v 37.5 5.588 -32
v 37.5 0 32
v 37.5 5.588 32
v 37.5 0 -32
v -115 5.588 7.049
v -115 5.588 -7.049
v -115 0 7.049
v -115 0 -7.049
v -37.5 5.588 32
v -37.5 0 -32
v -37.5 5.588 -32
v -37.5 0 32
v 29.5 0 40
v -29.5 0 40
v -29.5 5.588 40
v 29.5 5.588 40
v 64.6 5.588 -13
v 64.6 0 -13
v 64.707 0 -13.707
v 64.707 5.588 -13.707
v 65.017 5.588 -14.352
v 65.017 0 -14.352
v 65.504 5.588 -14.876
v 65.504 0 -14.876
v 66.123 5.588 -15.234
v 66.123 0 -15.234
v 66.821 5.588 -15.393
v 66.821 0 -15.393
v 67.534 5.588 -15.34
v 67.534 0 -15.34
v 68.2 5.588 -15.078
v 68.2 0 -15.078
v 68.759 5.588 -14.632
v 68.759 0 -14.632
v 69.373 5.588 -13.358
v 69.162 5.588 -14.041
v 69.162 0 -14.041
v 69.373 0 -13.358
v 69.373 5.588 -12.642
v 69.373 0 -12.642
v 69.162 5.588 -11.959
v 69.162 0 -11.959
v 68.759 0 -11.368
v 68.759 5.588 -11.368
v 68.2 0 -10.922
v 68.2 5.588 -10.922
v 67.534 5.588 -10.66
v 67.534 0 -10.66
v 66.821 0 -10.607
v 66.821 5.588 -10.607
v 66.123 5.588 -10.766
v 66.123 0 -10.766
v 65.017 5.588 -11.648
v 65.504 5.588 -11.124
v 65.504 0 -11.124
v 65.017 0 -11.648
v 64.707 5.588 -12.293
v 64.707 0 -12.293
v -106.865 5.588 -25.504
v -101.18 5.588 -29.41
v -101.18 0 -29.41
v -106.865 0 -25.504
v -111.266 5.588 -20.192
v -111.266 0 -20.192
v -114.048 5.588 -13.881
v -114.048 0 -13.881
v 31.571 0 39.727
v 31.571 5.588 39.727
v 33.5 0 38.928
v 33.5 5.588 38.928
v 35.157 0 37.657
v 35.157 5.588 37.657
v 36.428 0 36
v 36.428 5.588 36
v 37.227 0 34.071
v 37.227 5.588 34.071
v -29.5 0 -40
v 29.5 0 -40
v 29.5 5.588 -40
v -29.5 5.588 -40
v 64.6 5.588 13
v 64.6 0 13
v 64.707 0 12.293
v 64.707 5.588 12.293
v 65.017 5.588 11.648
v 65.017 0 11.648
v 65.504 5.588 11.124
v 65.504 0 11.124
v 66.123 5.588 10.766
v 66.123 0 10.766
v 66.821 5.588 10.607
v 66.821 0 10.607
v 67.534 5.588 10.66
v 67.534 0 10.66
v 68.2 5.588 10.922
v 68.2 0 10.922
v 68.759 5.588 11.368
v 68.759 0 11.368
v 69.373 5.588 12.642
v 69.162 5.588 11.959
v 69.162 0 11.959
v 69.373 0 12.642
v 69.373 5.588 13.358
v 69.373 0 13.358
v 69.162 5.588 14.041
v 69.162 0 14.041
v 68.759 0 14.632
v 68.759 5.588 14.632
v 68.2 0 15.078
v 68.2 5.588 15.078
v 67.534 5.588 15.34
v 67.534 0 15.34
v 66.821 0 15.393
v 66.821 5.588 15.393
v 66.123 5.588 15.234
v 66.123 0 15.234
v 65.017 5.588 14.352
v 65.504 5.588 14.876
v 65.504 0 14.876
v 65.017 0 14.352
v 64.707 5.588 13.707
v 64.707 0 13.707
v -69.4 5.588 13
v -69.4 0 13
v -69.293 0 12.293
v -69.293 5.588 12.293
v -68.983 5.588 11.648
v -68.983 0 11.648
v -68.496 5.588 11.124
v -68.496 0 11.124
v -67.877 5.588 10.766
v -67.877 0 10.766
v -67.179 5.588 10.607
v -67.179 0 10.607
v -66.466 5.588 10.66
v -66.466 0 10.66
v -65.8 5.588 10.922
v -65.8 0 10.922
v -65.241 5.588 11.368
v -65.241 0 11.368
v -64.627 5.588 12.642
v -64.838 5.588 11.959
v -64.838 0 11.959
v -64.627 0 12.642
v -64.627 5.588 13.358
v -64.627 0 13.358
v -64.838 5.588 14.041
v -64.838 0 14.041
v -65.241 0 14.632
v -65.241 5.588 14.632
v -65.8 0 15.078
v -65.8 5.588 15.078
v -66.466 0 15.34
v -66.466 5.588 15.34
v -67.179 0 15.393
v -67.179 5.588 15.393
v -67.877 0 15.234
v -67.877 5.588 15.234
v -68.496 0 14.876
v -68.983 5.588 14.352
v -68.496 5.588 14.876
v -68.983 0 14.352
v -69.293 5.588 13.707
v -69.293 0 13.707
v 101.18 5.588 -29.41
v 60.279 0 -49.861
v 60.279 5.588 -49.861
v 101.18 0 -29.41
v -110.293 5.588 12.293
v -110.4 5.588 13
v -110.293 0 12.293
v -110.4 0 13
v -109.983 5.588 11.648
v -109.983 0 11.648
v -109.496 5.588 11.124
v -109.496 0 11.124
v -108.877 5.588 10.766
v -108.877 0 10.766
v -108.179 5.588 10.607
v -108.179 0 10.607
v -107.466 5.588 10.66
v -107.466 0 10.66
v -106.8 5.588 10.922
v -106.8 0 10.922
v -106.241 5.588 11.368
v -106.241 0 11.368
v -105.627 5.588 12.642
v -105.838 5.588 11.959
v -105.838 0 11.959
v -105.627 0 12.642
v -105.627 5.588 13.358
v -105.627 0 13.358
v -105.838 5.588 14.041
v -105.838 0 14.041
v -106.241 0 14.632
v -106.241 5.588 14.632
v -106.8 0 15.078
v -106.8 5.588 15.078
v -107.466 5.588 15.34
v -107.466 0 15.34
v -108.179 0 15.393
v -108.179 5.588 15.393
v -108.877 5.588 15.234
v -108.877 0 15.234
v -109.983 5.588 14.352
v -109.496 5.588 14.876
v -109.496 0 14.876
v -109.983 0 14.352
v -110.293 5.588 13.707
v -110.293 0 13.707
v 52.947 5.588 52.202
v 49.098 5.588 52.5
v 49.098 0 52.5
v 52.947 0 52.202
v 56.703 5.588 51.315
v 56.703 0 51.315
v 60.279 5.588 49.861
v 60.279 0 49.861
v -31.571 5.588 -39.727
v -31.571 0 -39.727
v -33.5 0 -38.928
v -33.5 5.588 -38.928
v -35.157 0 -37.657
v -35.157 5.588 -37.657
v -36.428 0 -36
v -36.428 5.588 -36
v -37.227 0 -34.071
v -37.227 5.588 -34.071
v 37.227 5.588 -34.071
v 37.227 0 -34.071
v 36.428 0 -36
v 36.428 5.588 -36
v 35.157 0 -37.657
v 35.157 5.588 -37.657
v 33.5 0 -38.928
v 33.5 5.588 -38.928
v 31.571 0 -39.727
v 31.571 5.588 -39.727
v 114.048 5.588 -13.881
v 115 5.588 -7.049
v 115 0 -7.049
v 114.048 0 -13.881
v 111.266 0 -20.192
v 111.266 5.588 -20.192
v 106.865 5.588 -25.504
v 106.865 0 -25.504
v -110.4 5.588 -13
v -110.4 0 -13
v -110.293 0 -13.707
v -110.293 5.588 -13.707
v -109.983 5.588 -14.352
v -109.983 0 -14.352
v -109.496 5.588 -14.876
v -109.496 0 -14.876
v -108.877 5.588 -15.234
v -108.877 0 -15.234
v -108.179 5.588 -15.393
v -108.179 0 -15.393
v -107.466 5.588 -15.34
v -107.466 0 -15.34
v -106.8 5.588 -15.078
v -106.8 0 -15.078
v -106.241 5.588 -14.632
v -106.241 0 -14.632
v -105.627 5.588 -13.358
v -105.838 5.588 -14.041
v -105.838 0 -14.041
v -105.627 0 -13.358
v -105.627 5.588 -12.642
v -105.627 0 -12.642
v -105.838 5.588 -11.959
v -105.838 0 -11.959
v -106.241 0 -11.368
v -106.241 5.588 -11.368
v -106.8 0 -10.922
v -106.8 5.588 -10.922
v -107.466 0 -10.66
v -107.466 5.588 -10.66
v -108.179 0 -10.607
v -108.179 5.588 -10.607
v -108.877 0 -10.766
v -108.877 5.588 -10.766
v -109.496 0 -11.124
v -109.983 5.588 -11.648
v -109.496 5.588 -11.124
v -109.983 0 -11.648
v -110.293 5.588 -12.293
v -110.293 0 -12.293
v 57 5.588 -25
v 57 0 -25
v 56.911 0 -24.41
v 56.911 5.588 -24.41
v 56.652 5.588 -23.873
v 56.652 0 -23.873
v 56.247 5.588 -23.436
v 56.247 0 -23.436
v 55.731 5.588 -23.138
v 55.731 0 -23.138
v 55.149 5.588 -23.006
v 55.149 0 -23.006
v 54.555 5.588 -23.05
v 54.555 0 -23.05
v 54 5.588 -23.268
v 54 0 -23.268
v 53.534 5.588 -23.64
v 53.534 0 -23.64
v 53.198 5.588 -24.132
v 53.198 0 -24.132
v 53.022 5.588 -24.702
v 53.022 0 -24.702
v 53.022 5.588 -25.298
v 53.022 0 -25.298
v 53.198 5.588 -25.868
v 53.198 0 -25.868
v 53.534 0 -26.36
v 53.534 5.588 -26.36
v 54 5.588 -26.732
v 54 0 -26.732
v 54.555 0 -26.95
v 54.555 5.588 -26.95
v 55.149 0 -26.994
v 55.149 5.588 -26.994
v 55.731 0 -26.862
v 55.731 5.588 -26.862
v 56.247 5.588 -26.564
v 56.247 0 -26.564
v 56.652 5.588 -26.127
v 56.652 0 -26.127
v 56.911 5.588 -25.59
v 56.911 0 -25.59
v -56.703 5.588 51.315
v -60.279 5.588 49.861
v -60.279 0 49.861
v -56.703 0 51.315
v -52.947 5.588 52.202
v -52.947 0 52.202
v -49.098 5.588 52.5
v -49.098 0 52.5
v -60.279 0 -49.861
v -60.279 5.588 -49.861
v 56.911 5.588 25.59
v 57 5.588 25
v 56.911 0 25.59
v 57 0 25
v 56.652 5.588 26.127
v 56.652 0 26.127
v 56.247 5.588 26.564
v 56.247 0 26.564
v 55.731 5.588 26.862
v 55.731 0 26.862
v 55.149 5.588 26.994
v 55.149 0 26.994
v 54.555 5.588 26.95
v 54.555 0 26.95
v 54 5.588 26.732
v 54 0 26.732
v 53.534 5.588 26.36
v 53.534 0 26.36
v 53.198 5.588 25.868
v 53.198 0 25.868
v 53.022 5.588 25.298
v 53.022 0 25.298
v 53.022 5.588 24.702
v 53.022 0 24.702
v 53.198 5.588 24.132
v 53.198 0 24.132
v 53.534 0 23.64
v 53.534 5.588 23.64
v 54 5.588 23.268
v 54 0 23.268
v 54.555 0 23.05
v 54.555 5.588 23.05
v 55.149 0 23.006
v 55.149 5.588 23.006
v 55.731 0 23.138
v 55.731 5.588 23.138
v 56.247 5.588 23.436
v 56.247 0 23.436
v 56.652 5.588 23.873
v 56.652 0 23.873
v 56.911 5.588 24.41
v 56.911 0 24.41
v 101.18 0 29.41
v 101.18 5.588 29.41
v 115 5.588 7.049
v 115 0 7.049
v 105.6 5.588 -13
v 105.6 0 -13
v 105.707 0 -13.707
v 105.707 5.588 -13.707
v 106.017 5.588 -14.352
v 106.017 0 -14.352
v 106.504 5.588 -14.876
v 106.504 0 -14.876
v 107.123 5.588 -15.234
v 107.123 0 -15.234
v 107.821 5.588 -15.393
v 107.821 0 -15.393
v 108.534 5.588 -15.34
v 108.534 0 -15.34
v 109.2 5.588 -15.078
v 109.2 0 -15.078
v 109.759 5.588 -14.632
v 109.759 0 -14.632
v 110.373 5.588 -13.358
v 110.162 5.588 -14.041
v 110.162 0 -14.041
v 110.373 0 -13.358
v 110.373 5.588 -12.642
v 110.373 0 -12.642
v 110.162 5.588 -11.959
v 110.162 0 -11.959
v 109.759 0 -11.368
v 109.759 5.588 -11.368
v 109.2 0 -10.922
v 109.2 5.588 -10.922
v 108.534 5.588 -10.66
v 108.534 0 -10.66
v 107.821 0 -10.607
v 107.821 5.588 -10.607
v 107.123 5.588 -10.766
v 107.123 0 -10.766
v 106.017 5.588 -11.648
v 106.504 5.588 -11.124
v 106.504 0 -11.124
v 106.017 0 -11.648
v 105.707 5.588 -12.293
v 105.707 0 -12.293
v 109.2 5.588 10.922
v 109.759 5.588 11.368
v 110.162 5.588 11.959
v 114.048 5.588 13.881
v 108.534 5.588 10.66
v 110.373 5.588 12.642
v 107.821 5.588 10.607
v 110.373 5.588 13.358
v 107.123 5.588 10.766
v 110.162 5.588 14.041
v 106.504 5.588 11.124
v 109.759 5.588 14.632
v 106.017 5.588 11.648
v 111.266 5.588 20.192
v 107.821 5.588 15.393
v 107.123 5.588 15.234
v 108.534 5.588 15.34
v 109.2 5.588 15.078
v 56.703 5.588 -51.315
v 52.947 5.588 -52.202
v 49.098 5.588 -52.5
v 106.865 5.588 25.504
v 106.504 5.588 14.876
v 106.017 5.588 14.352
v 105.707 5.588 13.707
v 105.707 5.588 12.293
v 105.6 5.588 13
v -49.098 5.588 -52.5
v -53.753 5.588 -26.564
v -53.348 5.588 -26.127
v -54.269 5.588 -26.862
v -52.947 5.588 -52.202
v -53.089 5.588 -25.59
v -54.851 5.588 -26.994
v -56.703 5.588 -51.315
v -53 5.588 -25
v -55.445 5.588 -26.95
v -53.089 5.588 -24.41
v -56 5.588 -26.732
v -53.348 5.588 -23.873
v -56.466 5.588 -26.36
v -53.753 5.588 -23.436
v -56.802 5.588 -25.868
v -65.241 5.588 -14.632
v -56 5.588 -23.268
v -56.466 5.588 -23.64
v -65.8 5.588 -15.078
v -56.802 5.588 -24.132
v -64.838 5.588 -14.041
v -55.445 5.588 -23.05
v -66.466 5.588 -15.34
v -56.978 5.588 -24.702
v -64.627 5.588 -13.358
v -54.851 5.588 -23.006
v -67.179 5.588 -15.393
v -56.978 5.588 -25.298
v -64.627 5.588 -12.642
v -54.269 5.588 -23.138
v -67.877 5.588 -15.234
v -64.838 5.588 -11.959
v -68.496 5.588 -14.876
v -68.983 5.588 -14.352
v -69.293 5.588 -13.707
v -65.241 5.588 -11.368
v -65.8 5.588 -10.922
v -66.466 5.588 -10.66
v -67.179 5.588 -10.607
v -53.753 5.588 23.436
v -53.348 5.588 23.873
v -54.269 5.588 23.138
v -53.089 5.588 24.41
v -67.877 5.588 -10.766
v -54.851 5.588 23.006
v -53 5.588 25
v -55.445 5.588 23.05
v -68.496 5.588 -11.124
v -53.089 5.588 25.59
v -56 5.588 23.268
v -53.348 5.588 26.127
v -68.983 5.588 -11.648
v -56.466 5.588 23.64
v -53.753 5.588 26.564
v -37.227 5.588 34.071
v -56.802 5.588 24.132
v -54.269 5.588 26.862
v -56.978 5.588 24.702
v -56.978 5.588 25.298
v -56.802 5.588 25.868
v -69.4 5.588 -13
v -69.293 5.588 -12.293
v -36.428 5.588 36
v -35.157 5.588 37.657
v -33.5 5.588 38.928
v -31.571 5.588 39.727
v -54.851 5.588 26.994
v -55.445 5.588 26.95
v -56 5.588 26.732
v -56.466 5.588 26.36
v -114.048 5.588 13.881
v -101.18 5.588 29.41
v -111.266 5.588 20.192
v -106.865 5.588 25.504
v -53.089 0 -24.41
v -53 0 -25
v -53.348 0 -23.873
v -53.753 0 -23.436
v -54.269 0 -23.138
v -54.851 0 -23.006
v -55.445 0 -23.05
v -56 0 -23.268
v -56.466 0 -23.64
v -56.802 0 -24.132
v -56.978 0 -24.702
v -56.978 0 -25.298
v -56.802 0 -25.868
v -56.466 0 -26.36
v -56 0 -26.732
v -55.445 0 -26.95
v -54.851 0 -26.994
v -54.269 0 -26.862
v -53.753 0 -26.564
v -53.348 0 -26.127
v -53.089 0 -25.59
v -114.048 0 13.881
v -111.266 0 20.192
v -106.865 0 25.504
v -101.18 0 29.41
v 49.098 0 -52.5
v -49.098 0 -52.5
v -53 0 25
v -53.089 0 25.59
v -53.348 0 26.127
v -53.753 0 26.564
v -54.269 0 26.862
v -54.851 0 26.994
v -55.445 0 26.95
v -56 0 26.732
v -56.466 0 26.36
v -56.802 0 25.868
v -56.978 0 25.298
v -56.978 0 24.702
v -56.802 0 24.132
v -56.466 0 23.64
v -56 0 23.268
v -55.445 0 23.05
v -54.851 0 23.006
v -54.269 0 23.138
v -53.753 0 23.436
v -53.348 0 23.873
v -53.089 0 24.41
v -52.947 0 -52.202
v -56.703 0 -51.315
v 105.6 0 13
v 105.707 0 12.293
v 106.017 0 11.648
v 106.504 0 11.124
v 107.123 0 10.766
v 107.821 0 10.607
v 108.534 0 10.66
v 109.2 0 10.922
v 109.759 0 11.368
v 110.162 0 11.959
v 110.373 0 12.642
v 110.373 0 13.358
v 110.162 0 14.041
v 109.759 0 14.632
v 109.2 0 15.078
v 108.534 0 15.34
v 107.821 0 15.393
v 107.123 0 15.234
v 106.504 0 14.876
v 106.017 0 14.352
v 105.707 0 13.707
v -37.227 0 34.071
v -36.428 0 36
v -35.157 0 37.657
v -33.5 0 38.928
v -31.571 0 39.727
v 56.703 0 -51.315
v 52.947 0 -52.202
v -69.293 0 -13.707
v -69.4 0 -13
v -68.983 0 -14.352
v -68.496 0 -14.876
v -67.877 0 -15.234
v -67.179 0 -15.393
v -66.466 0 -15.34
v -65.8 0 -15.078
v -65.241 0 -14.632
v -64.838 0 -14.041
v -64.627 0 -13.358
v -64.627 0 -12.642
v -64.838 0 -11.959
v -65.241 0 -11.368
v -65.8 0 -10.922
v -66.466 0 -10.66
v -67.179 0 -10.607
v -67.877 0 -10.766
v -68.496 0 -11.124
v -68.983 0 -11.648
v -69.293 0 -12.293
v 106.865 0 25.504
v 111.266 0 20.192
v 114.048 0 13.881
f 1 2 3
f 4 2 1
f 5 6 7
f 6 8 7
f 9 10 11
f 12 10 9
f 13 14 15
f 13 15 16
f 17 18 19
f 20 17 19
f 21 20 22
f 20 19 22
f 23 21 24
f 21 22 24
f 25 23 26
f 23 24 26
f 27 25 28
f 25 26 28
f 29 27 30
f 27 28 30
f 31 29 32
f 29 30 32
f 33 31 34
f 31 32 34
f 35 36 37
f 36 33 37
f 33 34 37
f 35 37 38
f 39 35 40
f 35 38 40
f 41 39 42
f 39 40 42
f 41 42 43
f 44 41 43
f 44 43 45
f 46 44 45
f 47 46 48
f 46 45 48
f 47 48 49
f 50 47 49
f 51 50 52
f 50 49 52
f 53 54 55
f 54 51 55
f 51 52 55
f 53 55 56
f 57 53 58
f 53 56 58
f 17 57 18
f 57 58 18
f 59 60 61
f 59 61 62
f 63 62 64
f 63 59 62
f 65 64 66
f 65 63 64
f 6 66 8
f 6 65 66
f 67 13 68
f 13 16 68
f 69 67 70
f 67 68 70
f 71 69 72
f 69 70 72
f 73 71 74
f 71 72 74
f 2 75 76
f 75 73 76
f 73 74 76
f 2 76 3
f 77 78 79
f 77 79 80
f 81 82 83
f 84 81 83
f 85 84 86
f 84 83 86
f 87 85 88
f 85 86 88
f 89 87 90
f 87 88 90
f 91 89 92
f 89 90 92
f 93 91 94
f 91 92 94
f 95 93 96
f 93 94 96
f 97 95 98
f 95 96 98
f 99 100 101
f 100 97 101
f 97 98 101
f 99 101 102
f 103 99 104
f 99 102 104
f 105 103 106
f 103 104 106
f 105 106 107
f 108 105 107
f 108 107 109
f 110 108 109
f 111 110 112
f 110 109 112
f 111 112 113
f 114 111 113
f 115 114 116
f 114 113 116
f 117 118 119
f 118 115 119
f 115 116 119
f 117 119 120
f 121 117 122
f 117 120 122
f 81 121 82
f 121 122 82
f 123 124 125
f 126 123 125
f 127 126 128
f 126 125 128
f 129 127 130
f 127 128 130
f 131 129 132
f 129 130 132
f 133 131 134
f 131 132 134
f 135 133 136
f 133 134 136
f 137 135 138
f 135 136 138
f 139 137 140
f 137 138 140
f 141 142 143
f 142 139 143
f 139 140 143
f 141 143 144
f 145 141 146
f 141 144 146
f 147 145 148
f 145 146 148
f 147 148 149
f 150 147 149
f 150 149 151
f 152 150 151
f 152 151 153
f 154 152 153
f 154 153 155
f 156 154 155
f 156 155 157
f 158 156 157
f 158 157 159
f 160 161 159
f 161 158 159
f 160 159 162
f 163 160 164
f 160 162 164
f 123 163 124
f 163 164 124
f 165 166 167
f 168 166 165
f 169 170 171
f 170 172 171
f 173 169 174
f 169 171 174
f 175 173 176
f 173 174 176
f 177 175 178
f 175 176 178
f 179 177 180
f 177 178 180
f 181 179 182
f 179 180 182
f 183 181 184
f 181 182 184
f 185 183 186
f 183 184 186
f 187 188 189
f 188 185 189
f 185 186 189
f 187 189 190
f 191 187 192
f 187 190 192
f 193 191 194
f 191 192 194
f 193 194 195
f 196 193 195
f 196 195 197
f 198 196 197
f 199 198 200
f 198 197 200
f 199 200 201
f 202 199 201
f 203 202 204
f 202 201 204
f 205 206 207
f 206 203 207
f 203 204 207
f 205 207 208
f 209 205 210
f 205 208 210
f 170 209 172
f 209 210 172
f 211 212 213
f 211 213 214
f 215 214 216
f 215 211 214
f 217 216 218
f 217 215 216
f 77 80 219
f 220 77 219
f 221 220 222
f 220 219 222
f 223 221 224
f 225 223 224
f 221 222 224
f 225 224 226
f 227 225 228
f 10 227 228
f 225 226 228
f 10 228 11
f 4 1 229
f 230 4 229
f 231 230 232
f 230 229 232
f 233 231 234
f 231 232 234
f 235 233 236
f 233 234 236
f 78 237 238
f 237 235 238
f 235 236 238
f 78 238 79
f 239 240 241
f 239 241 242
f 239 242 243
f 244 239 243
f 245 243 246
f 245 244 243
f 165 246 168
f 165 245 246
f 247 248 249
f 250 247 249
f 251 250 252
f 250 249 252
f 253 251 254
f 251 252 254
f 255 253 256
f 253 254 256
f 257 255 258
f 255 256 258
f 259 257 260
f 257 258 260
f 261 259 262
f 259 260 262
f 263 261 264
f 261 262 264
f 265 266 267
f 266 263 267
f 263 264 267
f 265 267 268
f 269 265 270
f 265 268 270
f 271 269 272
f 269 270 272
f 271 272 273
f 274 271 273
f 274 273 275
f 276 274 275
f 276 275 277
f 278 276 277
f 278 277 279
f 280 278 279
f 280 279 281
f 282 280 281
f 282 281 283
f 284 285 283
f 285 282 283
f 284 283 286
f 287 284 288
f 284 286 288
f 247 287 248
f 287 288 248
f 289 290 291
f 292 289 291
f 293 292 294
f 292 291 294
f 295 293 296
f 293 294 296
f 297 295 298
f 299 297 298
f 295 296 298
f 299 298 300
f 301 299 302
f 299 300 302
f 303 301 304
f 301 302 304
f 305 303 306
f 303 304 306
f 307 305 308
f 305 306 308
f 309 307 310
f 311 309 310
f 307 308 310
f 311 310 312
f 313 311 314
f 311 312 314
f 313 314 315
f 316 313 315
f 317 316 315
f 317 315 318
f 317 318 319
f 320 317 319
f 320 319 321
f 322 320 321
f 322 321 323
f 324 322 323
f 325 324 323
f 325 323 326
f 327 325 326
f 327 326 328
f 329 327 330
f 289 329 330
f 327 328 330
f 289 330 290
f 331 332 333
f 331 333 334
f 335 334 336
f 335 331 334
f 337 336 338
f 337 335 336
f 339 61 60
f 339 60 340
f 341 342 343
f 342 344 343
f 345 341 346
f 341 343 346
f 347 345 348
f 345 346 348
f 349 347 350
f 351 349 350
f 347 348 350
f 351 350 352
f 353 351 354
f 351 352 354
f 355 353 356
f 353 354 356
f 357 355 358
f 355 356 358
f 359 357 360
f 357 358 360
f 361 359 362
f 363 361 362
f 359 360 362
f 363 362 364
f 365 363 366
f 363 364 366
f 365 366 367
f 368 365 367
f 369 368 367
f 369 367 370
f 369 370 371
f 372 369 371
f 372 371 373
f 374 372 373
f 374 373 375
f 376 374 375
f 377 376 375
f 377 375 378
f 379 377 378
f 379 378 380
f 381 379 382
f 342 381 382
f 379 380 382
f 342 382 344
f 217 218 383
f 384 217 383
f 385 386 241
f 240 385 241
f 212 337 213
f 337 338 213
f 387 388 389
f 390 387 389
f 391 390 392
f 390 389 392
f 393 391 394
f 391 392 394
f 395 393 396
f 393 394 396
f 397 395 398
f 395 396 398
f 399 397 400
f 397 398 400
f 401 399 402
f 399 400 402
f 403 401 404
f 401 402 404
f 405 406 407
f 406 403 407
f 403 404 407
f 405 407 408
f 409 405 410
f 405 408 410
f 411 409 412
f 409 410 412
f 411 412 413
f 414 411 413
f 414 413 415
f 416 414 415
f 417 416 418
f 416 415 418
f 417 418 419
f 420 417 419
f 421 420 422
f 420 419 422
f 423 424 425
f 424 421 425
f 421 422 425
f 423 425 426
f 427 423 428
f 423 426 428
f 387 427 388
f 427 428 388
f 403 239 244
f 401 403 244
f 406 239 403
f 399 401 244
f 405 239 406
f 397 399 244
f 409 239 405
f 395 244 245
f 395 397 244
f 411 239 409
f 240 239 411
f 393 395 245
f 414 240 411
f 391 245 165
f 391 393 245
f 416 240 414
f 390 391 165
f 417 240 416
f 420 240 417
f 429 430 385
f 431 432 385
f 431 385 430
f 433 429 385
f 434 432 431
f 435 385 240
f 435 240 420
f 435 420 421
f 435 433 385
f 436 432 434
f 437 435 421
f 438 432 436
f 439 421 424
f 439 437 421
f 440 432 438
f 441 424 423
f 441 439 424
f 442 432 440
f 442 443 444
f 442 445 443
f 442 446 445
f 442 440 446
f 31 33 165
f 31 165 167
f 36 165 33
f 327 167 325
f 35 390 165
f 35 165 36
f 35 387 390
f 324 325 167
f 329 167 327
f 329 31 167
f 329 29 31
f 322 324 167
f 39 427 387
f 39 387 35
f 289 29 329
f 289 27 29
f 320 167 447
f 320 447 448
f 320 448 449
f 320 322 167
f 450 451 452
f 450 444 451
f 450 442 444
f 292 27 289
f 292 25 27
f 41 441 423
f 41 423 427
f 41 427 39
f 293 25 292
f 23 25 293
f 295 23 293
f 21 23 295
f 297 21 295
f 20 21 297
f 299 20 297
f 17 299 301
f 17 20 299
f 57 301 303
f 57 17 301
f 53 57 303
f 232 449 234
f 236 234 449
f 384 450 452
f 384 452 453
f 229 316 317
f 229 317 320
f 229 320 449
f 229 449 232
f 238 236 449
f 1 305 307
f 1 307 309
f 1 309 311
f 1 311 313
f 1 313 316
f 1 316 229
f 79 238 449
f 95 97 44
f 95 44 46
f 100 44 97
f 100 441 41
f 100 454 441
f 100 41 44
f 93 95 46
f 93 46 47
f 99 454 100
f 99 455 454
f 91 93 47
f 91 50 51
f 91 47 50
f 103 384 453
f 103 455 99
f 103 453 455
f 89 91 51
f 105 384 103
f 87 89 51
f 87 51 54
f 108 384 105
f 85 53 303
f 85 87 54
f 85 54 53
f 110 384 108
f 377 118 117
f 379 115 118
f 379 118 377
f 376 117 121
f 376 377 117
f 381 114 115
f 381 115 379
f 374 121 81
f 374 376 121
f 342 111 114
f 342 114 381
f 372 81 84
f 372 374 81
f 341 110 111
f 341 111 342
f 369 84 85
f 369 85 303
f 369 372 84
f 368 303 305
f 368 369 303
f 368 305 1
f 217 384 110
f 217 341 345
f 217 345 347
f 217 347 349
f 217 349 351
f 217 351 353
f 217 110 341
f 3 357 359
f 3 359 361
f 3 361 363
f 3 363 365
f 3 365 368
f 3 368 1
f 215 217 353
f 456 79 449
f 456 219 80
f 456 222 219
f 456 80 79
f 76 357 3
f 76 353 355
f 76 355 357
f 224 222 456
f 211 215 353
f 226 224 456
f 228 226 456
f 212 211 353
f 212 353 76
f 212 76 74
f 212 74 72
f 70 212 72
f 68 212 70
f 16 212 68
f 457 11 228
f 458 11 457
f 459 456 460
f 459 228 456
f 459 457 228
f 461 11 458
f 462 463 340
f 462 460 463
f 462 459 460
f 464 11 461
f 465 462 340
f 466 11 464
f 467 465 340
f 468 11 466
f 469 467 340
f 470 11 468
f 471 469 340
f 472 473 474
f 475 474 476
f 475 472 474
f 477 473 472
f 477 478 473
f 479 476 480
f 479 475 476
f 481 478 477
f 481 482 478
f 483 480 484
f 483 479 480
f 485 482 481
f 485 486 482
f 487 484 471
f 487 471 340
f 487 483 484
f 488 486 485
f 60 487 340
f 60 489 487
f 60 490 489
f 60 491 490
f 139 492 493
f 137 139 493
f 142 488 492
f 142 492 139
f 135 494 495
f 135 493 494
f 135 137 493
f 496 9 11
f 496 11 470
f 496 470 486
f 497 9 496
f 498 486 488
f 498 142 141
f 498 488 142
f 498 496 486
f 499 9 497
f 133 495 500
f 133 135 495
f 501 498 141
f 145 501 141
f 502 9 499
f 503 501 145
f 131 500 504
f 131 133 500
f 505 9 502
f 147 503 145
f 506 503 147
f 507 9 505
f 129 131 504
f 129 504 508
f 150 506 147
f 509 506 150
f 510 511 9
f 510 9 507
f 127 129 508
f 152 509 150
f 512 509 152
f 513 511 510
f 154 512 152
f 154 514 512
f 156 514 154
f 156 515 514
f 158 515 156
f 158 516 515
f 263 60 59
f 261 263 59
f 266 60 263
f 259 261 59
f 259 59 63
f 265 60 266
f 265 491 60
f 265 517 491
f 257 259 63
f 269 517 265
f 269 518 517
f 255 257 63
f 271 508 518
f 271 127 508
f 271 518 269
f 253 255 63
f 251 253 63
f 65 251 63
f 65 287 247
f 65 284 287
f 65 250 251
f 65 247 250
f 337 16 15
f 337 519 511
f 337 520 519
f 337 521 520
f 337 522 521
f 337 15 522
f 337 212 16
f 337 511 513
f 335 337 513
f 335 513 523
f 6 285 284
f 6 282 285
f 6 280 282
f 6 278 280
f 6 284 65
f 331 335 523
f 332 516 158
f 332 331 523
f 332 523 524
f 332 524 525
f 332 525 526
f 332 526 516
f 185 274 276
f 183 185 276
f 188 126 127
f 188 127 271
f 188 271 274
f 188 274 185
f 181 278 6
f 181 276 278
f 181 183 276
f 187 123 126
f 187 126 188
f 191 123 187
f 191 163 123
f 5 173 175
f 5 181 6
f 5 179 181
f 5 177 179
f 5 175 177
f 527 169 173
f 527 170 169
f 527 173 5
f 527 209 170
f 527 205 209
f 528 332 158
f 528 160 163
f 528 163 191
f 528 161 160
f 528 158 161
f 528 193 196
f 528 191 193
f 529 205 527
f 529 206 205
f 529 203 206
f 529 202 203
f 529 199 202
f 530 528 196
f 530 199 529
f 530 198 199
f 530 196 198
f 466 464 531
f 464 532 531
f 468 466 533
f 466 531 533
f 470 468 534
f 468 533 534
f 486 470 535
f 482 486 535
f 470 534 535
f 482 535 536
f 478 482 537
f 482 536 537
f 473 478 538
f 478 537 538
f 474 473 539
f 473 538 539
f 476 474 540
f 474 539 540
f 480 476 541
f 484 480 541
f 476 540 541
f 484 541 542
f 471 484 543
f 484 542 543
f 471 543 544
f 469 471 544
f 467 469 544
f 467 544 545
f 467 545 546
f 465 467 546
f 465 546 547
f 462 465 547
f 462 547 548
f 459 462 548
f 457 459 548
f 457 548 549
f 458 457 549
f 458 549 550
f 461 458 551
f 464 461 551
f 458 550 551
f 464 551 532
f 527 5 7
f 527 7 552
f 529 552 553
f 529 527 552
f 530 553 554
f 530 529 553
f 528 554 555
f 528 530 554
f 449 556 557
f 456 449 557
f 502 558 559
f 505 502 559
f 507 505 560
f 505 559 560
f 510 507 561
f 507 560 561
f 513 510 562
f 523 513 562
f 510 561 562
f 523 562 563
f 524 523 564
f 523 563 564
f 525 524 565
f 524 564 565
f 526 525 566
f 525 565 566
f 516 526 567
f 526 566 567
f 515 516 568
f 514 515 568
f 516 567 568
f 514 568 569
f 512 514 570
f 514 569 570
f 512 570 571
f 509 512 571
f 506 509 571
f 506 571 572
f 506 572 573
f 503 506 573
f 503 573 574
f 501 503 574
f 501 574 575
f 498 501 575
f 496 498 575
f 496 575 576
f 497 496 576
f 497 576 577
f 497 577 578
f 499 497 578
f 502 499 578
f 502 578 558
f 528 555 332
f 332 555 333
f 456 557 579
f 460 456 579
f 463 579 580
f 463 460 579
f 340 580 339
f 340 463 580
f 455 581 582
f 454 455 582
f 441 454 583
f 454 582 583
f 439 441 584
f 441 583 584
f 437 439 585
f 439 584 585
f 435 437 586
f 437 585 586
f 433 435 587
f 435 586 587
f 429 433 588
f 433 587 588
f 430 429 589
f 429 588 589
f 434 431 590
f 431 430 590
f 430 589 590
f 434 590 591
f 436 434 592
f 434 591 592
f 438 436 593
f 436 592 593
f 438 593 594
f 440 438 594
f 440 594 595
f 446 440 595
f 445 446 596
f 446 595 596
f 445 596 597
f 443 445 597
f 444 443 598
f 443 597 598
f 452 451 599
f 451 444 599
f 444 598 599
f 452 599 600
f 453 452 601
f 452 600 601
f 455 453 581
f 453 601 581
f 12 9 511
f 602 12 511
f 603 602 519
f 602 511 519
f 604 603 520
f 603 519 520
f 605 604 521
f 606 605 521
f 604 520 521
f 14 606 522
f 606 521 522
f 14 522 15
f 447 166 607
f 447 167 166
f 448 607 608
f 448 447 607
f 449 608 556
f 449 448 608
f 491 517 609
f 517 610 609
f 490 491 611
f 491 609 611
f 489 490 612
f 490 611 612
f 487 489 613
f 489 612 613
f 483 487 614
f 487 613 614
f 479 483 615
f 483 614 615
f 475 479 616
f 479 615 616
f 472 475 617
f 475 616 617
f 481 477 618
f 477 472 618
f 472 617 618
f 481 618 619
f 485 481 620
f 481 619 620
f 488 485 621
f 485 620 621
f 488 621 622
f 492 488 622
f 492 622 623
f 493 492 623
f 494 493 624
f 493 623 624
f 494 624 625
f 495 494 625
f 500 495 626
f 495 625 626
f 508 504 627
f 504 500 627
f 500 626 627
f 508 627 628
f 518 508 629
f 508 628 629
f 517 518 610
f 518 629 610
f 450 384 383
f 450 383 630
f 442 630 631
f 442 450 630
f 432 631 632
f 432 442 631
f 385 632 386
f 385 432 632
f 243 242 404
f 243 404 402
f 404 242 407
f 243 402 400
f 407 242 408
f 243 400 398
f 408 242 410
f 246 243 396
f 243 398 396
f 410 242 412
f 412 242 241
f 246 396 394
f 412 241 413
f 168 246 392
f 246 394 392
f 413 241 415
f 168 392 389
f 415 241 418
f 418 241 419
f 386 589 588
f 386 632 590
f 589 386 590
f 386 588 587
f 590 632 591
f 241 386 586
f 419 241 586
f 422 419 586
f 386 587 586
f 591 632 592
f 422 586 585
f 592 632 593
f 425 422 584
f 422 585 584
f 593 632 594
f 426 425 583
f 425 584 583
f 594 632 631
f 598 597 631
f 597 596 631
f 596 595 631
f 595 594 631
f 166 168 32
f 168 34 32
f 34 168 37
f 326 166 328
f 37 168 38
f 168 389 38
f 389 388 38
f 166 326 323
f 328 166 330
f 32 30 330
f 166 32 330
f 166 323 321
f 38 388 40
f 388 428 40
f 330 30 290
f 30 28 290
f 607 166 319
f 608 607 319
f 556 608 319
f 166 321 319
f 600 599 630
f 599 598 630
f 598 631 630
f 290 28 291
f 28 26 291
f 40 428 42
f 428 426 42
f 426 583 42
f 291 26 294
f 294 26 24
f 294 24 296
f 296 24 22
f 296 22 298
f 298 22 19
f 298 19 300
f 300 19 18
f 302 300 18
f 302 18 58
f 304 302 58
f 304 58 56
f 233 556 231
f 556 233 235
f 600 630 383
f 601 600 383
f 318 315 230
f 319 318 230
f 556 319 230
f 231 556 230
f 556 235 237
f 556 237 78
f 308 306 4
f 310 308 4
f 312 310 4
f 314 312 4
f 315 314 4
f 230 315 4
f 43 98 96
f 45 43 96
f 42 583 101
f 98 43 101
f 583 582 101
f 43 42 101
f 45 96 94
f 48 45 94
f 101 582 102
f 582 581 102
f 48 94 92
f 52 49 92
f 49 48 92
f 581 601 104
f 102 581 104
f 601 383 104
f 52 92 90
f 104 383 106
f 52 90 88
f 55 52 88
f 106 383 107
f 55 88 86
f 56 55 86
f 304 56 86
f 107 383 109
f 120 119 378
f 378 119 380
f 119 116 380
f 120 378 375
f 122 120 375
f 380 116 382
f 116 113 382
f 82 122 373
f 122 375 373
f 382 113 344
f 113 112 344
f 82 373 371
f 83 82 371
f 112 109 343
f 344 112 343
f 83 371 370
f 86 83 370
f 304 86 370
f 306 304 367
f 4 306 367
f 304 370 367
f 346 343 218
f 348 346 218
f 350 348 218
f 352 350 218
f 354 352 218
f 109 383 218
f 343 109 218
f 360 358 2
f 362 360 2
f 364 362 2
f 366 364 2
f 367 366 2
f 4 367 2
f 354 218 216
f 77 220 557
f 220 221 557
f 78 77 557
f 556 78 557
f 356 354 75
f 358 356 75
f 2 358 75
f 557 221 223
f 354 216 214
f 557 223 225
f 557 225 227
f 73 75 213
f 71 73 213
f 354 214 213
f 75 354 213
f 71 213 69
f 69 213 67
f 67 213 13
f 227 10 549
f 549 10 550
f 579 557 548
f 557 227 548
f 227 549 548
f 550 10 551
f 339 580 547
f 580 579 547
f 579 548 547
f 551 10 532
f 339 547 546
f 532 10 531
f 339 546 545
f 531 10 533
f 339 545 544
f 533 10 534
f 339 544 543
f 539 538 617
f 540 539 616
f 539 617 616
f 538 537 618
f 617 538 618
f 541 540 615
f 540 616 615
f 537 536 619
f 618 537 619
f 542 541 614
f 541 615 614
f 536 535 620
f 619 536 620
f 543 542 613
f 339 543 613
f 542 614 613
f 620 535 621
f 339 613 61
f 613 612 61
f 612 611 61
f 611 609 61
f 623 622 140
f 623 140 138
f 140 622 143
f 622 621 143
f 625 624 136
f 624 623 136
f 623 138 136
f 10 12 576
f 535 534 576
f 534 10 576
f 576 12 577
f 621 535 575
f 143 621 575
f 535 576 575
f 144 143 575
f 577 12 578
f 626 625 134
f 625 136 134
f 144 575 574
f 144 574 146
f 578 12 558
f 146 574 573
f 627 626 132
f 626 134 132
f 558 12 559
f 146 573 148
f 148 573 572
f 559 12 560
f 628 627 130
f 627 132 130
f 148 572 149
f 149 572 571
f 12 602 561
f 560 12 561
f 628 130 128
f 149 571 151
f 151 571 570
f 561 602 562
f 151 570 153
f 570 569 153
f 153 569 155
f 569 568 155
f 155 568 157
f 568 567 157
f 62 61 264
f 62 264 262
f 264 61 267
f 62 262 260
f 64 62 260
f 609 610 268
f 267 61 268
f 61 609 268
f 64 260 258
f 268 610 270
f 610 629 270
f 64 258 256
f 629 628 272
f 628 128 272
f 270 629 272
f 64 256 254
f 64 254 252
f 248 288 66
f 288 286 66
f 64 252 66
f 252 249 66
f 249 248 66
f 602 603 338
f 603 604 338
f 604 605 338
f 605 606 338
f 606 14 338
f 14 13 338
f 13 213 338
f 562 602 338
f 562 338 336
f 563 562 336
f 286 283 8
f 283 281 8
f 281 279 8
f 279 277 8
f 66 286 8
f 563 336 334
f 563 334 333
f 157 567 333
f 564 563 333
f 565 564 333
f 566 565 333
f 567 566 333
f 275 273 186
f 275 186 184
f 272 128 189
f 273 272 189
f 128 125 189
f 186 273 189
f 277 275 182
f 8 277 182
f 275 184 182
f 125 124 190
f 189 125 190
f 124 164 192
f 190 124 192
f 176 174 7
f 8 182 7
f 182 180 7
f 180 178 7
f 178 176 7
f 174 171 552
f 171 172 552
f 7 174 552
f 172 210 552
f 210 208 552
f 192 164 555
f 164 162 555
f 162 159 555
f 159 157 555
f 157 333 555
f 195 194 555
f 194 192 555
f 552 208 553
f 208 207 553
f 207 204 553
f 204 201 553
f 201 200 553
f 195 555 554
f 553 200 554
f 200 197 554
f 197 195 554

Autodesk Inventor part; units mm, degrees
ref_plane "YZ Plane" through (0, 0, 0) normal (1, 0, 0) x (0, 1, 0)
ref_plane "XZ Plane" through (0, 0, 0) normal (0, 1, 0) x (-1, 0, 0)
ref_plane "XY Plane" through (0, 0, 0) normal (0, 0, 1) x (1, 0, 0)
sketch "Sketch1" plane through (0, 0, 0) normal (0, 1, 0) x (-1, 0, 0)
  line L0 (-115, -52.5) -> (115, -52.5)
  line L1 (115, -52.5) -> (115, 52.5)
  line L2 (115, 52.5) -> (-115, 52.5)
  line L3 (-115, 52.5) -> (-115, -52.5)
  line L4 (-115, -52.5) -> (115, 52.5) construction
  line L5 (115, -52.5) -> (-115, 52.5) construction
  line L6 (-108, 13) -> (-67, 13) construction
  line L7 (-67, 13) -> (-67, -13) construction
  line L8 (-67, -13) -> (-108, -13) construction
  line L9 (-108, -13) -> (-108, 13) construction
  line L10 (-108, 13) -> (-67, -13) construction
  line L11 (-67, 13) -> (-108, -13) construction
  line L12 (67, 13) -> (108, 13) construction
  line L13 (108, 13) -> (108, -13) construction
  line L14 (108, -13) -> (67, -13) construction
  line L15 (67, -13) -> (67, 13) construction
  line L16 (67, 13) -> (108, -13) construction
  line L17 (108, 13) -> (67, -13) construction
  circle A0 centre (-67, 13) radius 2.4
  circle A1 centre (-67, -13) radius 2.4
  circle A2 centre (-108, -13) radius 2.4
  circle A3 centre (-108, 13) radius 2.4
  circle A4 centre (67, 13) radius 2.4
  circle A5 centre (108, 13) radius 2.4
  circle A6 centre (108, -13) radius 2.4
  circle A7 centre (67, -13) radius 2.4
  line L18 (-37.5, -40) -> (37.5, -40)
  line L19 (37.5, -40) -> (37.5, 40)
  line L20 (37.5, 40) -> (-37.5, 40)
  line L21 (-37.5, 40) -> (-37.5, -40)
  line L22 (-37.5, -40) -> (37.5, 40) construction
  line L23 (37.5, -40) -> (-37.5, 40) construction
  point P0 (0, 0)
  point P1 (-87.5, 0)
  point P2 (87.5, 0)
  dimension "d0" = 105
  dimension "d3" = 26
  dimension "d4" = 41
  dimension "d5" = 175
  dimension "d6" = 87.5
  dimension "d7" = 230
  dimension "d8" = 4.8
  dimension "d9" = 80
  dimension "d10" = 75
extrude "Extrusion1" add sketch "Sketch1" along normal blind 5.588
sketch "Sketch2" plane through (0, 0, 0) normal (0, -1, 0) x (1, 0, 0)
  line L0 (115, -52.5) -> (-115, -52.5) projected
  line L1 (115, 52.5) -> (115, -52.5) projected
  line L2 (-115, 52.5) -> (115, 52.5) projected
  line L3 (-115, -52.5) -> (-115, 52.5) projected
  line L4 (-115, 52.5) -> (-115, 22.5)
  line L5 (-115, 22.5) -> (-55, 52.5)
  line L6 (-55, 52.5) -> (-115, 52.5)
  line L7 (-115, -22.5) -> (-115, -52.5)
  line L8 (-115, -52.5) -> (-55, -52.5)
  line L9 (-115, -22.5) -> (-55, -52.5)
  line L10 (55, 52.5) -> (115, 22.5)
  line L11 (115, 22.5) -> (115, 52.5)
  line L12 (115, 52.5) -> (55, 52.5)
  line L13 (115, -22.5) -> (115, -52.5)
  line L14 (115, -52.5) -> (55, -52.5)
  line L15 (55, -52.5) -> (115, -22.5)
  point P0 (0, 0)
  dimension "d13" = 60
  dimension "d14" = 30
extrude "Extrusion2" cut sketch "Sketch2" against normal blind 10 contours L0 L15 L1 | L0 L3 L9 | L10 L2 L1 | L3 L2 L5
fillet "Fillet1" radius 25 8 edges at (-55, 2.794, -52.5) (-115, 2.794, -22.5) (55, 2.794, -52.5) (115, 2.794, -22.5) (115, 2.794, 22.5) (55, 2.794, 52.5) (-55, 2.794, 52.5) (-115, 2.794, 22.5)
sketch "Sketch4" plane through (0, 0, 0) normal (0, -1, 0) x (1, 0, 0)
  line L0 (55, -25) -> (-55, -25) construction
  line L1 (-55, -25) -> (-55, 25) construction
  line L2 (-55, 25) -> (55, 25) construction
  line L3 (55, 25) -> (55, -25) construction
  line L4 (55, -25) -> (-55, 25) construction
  line L5 (-55, -25) -> (55, 25) construction
  circle A0 centre (-55, 25) radius 2
  circle A1 centre (-55, -25) radius 2
  circle A2 centre (55, -25) radius 2
  circle A3 centre (55, 25) radius 2
  point P0 (0, 0)
  dimension "d18" = 4
  dimension "d20" = 50
  dimension "d23" = 110
extrude "Extrusion3" cut sketch "Sketch4" against normal blind 10
fillet "Fillet2" radius 8 4 edges at (-37.5, 2.794, 40) (37.5, 2.794, 40) (-37.5, 2.794, -40) (37.5, 2.794, -40)
equation "\"d6\" = 0.5 * d5"
properties part number "VatPlate"
